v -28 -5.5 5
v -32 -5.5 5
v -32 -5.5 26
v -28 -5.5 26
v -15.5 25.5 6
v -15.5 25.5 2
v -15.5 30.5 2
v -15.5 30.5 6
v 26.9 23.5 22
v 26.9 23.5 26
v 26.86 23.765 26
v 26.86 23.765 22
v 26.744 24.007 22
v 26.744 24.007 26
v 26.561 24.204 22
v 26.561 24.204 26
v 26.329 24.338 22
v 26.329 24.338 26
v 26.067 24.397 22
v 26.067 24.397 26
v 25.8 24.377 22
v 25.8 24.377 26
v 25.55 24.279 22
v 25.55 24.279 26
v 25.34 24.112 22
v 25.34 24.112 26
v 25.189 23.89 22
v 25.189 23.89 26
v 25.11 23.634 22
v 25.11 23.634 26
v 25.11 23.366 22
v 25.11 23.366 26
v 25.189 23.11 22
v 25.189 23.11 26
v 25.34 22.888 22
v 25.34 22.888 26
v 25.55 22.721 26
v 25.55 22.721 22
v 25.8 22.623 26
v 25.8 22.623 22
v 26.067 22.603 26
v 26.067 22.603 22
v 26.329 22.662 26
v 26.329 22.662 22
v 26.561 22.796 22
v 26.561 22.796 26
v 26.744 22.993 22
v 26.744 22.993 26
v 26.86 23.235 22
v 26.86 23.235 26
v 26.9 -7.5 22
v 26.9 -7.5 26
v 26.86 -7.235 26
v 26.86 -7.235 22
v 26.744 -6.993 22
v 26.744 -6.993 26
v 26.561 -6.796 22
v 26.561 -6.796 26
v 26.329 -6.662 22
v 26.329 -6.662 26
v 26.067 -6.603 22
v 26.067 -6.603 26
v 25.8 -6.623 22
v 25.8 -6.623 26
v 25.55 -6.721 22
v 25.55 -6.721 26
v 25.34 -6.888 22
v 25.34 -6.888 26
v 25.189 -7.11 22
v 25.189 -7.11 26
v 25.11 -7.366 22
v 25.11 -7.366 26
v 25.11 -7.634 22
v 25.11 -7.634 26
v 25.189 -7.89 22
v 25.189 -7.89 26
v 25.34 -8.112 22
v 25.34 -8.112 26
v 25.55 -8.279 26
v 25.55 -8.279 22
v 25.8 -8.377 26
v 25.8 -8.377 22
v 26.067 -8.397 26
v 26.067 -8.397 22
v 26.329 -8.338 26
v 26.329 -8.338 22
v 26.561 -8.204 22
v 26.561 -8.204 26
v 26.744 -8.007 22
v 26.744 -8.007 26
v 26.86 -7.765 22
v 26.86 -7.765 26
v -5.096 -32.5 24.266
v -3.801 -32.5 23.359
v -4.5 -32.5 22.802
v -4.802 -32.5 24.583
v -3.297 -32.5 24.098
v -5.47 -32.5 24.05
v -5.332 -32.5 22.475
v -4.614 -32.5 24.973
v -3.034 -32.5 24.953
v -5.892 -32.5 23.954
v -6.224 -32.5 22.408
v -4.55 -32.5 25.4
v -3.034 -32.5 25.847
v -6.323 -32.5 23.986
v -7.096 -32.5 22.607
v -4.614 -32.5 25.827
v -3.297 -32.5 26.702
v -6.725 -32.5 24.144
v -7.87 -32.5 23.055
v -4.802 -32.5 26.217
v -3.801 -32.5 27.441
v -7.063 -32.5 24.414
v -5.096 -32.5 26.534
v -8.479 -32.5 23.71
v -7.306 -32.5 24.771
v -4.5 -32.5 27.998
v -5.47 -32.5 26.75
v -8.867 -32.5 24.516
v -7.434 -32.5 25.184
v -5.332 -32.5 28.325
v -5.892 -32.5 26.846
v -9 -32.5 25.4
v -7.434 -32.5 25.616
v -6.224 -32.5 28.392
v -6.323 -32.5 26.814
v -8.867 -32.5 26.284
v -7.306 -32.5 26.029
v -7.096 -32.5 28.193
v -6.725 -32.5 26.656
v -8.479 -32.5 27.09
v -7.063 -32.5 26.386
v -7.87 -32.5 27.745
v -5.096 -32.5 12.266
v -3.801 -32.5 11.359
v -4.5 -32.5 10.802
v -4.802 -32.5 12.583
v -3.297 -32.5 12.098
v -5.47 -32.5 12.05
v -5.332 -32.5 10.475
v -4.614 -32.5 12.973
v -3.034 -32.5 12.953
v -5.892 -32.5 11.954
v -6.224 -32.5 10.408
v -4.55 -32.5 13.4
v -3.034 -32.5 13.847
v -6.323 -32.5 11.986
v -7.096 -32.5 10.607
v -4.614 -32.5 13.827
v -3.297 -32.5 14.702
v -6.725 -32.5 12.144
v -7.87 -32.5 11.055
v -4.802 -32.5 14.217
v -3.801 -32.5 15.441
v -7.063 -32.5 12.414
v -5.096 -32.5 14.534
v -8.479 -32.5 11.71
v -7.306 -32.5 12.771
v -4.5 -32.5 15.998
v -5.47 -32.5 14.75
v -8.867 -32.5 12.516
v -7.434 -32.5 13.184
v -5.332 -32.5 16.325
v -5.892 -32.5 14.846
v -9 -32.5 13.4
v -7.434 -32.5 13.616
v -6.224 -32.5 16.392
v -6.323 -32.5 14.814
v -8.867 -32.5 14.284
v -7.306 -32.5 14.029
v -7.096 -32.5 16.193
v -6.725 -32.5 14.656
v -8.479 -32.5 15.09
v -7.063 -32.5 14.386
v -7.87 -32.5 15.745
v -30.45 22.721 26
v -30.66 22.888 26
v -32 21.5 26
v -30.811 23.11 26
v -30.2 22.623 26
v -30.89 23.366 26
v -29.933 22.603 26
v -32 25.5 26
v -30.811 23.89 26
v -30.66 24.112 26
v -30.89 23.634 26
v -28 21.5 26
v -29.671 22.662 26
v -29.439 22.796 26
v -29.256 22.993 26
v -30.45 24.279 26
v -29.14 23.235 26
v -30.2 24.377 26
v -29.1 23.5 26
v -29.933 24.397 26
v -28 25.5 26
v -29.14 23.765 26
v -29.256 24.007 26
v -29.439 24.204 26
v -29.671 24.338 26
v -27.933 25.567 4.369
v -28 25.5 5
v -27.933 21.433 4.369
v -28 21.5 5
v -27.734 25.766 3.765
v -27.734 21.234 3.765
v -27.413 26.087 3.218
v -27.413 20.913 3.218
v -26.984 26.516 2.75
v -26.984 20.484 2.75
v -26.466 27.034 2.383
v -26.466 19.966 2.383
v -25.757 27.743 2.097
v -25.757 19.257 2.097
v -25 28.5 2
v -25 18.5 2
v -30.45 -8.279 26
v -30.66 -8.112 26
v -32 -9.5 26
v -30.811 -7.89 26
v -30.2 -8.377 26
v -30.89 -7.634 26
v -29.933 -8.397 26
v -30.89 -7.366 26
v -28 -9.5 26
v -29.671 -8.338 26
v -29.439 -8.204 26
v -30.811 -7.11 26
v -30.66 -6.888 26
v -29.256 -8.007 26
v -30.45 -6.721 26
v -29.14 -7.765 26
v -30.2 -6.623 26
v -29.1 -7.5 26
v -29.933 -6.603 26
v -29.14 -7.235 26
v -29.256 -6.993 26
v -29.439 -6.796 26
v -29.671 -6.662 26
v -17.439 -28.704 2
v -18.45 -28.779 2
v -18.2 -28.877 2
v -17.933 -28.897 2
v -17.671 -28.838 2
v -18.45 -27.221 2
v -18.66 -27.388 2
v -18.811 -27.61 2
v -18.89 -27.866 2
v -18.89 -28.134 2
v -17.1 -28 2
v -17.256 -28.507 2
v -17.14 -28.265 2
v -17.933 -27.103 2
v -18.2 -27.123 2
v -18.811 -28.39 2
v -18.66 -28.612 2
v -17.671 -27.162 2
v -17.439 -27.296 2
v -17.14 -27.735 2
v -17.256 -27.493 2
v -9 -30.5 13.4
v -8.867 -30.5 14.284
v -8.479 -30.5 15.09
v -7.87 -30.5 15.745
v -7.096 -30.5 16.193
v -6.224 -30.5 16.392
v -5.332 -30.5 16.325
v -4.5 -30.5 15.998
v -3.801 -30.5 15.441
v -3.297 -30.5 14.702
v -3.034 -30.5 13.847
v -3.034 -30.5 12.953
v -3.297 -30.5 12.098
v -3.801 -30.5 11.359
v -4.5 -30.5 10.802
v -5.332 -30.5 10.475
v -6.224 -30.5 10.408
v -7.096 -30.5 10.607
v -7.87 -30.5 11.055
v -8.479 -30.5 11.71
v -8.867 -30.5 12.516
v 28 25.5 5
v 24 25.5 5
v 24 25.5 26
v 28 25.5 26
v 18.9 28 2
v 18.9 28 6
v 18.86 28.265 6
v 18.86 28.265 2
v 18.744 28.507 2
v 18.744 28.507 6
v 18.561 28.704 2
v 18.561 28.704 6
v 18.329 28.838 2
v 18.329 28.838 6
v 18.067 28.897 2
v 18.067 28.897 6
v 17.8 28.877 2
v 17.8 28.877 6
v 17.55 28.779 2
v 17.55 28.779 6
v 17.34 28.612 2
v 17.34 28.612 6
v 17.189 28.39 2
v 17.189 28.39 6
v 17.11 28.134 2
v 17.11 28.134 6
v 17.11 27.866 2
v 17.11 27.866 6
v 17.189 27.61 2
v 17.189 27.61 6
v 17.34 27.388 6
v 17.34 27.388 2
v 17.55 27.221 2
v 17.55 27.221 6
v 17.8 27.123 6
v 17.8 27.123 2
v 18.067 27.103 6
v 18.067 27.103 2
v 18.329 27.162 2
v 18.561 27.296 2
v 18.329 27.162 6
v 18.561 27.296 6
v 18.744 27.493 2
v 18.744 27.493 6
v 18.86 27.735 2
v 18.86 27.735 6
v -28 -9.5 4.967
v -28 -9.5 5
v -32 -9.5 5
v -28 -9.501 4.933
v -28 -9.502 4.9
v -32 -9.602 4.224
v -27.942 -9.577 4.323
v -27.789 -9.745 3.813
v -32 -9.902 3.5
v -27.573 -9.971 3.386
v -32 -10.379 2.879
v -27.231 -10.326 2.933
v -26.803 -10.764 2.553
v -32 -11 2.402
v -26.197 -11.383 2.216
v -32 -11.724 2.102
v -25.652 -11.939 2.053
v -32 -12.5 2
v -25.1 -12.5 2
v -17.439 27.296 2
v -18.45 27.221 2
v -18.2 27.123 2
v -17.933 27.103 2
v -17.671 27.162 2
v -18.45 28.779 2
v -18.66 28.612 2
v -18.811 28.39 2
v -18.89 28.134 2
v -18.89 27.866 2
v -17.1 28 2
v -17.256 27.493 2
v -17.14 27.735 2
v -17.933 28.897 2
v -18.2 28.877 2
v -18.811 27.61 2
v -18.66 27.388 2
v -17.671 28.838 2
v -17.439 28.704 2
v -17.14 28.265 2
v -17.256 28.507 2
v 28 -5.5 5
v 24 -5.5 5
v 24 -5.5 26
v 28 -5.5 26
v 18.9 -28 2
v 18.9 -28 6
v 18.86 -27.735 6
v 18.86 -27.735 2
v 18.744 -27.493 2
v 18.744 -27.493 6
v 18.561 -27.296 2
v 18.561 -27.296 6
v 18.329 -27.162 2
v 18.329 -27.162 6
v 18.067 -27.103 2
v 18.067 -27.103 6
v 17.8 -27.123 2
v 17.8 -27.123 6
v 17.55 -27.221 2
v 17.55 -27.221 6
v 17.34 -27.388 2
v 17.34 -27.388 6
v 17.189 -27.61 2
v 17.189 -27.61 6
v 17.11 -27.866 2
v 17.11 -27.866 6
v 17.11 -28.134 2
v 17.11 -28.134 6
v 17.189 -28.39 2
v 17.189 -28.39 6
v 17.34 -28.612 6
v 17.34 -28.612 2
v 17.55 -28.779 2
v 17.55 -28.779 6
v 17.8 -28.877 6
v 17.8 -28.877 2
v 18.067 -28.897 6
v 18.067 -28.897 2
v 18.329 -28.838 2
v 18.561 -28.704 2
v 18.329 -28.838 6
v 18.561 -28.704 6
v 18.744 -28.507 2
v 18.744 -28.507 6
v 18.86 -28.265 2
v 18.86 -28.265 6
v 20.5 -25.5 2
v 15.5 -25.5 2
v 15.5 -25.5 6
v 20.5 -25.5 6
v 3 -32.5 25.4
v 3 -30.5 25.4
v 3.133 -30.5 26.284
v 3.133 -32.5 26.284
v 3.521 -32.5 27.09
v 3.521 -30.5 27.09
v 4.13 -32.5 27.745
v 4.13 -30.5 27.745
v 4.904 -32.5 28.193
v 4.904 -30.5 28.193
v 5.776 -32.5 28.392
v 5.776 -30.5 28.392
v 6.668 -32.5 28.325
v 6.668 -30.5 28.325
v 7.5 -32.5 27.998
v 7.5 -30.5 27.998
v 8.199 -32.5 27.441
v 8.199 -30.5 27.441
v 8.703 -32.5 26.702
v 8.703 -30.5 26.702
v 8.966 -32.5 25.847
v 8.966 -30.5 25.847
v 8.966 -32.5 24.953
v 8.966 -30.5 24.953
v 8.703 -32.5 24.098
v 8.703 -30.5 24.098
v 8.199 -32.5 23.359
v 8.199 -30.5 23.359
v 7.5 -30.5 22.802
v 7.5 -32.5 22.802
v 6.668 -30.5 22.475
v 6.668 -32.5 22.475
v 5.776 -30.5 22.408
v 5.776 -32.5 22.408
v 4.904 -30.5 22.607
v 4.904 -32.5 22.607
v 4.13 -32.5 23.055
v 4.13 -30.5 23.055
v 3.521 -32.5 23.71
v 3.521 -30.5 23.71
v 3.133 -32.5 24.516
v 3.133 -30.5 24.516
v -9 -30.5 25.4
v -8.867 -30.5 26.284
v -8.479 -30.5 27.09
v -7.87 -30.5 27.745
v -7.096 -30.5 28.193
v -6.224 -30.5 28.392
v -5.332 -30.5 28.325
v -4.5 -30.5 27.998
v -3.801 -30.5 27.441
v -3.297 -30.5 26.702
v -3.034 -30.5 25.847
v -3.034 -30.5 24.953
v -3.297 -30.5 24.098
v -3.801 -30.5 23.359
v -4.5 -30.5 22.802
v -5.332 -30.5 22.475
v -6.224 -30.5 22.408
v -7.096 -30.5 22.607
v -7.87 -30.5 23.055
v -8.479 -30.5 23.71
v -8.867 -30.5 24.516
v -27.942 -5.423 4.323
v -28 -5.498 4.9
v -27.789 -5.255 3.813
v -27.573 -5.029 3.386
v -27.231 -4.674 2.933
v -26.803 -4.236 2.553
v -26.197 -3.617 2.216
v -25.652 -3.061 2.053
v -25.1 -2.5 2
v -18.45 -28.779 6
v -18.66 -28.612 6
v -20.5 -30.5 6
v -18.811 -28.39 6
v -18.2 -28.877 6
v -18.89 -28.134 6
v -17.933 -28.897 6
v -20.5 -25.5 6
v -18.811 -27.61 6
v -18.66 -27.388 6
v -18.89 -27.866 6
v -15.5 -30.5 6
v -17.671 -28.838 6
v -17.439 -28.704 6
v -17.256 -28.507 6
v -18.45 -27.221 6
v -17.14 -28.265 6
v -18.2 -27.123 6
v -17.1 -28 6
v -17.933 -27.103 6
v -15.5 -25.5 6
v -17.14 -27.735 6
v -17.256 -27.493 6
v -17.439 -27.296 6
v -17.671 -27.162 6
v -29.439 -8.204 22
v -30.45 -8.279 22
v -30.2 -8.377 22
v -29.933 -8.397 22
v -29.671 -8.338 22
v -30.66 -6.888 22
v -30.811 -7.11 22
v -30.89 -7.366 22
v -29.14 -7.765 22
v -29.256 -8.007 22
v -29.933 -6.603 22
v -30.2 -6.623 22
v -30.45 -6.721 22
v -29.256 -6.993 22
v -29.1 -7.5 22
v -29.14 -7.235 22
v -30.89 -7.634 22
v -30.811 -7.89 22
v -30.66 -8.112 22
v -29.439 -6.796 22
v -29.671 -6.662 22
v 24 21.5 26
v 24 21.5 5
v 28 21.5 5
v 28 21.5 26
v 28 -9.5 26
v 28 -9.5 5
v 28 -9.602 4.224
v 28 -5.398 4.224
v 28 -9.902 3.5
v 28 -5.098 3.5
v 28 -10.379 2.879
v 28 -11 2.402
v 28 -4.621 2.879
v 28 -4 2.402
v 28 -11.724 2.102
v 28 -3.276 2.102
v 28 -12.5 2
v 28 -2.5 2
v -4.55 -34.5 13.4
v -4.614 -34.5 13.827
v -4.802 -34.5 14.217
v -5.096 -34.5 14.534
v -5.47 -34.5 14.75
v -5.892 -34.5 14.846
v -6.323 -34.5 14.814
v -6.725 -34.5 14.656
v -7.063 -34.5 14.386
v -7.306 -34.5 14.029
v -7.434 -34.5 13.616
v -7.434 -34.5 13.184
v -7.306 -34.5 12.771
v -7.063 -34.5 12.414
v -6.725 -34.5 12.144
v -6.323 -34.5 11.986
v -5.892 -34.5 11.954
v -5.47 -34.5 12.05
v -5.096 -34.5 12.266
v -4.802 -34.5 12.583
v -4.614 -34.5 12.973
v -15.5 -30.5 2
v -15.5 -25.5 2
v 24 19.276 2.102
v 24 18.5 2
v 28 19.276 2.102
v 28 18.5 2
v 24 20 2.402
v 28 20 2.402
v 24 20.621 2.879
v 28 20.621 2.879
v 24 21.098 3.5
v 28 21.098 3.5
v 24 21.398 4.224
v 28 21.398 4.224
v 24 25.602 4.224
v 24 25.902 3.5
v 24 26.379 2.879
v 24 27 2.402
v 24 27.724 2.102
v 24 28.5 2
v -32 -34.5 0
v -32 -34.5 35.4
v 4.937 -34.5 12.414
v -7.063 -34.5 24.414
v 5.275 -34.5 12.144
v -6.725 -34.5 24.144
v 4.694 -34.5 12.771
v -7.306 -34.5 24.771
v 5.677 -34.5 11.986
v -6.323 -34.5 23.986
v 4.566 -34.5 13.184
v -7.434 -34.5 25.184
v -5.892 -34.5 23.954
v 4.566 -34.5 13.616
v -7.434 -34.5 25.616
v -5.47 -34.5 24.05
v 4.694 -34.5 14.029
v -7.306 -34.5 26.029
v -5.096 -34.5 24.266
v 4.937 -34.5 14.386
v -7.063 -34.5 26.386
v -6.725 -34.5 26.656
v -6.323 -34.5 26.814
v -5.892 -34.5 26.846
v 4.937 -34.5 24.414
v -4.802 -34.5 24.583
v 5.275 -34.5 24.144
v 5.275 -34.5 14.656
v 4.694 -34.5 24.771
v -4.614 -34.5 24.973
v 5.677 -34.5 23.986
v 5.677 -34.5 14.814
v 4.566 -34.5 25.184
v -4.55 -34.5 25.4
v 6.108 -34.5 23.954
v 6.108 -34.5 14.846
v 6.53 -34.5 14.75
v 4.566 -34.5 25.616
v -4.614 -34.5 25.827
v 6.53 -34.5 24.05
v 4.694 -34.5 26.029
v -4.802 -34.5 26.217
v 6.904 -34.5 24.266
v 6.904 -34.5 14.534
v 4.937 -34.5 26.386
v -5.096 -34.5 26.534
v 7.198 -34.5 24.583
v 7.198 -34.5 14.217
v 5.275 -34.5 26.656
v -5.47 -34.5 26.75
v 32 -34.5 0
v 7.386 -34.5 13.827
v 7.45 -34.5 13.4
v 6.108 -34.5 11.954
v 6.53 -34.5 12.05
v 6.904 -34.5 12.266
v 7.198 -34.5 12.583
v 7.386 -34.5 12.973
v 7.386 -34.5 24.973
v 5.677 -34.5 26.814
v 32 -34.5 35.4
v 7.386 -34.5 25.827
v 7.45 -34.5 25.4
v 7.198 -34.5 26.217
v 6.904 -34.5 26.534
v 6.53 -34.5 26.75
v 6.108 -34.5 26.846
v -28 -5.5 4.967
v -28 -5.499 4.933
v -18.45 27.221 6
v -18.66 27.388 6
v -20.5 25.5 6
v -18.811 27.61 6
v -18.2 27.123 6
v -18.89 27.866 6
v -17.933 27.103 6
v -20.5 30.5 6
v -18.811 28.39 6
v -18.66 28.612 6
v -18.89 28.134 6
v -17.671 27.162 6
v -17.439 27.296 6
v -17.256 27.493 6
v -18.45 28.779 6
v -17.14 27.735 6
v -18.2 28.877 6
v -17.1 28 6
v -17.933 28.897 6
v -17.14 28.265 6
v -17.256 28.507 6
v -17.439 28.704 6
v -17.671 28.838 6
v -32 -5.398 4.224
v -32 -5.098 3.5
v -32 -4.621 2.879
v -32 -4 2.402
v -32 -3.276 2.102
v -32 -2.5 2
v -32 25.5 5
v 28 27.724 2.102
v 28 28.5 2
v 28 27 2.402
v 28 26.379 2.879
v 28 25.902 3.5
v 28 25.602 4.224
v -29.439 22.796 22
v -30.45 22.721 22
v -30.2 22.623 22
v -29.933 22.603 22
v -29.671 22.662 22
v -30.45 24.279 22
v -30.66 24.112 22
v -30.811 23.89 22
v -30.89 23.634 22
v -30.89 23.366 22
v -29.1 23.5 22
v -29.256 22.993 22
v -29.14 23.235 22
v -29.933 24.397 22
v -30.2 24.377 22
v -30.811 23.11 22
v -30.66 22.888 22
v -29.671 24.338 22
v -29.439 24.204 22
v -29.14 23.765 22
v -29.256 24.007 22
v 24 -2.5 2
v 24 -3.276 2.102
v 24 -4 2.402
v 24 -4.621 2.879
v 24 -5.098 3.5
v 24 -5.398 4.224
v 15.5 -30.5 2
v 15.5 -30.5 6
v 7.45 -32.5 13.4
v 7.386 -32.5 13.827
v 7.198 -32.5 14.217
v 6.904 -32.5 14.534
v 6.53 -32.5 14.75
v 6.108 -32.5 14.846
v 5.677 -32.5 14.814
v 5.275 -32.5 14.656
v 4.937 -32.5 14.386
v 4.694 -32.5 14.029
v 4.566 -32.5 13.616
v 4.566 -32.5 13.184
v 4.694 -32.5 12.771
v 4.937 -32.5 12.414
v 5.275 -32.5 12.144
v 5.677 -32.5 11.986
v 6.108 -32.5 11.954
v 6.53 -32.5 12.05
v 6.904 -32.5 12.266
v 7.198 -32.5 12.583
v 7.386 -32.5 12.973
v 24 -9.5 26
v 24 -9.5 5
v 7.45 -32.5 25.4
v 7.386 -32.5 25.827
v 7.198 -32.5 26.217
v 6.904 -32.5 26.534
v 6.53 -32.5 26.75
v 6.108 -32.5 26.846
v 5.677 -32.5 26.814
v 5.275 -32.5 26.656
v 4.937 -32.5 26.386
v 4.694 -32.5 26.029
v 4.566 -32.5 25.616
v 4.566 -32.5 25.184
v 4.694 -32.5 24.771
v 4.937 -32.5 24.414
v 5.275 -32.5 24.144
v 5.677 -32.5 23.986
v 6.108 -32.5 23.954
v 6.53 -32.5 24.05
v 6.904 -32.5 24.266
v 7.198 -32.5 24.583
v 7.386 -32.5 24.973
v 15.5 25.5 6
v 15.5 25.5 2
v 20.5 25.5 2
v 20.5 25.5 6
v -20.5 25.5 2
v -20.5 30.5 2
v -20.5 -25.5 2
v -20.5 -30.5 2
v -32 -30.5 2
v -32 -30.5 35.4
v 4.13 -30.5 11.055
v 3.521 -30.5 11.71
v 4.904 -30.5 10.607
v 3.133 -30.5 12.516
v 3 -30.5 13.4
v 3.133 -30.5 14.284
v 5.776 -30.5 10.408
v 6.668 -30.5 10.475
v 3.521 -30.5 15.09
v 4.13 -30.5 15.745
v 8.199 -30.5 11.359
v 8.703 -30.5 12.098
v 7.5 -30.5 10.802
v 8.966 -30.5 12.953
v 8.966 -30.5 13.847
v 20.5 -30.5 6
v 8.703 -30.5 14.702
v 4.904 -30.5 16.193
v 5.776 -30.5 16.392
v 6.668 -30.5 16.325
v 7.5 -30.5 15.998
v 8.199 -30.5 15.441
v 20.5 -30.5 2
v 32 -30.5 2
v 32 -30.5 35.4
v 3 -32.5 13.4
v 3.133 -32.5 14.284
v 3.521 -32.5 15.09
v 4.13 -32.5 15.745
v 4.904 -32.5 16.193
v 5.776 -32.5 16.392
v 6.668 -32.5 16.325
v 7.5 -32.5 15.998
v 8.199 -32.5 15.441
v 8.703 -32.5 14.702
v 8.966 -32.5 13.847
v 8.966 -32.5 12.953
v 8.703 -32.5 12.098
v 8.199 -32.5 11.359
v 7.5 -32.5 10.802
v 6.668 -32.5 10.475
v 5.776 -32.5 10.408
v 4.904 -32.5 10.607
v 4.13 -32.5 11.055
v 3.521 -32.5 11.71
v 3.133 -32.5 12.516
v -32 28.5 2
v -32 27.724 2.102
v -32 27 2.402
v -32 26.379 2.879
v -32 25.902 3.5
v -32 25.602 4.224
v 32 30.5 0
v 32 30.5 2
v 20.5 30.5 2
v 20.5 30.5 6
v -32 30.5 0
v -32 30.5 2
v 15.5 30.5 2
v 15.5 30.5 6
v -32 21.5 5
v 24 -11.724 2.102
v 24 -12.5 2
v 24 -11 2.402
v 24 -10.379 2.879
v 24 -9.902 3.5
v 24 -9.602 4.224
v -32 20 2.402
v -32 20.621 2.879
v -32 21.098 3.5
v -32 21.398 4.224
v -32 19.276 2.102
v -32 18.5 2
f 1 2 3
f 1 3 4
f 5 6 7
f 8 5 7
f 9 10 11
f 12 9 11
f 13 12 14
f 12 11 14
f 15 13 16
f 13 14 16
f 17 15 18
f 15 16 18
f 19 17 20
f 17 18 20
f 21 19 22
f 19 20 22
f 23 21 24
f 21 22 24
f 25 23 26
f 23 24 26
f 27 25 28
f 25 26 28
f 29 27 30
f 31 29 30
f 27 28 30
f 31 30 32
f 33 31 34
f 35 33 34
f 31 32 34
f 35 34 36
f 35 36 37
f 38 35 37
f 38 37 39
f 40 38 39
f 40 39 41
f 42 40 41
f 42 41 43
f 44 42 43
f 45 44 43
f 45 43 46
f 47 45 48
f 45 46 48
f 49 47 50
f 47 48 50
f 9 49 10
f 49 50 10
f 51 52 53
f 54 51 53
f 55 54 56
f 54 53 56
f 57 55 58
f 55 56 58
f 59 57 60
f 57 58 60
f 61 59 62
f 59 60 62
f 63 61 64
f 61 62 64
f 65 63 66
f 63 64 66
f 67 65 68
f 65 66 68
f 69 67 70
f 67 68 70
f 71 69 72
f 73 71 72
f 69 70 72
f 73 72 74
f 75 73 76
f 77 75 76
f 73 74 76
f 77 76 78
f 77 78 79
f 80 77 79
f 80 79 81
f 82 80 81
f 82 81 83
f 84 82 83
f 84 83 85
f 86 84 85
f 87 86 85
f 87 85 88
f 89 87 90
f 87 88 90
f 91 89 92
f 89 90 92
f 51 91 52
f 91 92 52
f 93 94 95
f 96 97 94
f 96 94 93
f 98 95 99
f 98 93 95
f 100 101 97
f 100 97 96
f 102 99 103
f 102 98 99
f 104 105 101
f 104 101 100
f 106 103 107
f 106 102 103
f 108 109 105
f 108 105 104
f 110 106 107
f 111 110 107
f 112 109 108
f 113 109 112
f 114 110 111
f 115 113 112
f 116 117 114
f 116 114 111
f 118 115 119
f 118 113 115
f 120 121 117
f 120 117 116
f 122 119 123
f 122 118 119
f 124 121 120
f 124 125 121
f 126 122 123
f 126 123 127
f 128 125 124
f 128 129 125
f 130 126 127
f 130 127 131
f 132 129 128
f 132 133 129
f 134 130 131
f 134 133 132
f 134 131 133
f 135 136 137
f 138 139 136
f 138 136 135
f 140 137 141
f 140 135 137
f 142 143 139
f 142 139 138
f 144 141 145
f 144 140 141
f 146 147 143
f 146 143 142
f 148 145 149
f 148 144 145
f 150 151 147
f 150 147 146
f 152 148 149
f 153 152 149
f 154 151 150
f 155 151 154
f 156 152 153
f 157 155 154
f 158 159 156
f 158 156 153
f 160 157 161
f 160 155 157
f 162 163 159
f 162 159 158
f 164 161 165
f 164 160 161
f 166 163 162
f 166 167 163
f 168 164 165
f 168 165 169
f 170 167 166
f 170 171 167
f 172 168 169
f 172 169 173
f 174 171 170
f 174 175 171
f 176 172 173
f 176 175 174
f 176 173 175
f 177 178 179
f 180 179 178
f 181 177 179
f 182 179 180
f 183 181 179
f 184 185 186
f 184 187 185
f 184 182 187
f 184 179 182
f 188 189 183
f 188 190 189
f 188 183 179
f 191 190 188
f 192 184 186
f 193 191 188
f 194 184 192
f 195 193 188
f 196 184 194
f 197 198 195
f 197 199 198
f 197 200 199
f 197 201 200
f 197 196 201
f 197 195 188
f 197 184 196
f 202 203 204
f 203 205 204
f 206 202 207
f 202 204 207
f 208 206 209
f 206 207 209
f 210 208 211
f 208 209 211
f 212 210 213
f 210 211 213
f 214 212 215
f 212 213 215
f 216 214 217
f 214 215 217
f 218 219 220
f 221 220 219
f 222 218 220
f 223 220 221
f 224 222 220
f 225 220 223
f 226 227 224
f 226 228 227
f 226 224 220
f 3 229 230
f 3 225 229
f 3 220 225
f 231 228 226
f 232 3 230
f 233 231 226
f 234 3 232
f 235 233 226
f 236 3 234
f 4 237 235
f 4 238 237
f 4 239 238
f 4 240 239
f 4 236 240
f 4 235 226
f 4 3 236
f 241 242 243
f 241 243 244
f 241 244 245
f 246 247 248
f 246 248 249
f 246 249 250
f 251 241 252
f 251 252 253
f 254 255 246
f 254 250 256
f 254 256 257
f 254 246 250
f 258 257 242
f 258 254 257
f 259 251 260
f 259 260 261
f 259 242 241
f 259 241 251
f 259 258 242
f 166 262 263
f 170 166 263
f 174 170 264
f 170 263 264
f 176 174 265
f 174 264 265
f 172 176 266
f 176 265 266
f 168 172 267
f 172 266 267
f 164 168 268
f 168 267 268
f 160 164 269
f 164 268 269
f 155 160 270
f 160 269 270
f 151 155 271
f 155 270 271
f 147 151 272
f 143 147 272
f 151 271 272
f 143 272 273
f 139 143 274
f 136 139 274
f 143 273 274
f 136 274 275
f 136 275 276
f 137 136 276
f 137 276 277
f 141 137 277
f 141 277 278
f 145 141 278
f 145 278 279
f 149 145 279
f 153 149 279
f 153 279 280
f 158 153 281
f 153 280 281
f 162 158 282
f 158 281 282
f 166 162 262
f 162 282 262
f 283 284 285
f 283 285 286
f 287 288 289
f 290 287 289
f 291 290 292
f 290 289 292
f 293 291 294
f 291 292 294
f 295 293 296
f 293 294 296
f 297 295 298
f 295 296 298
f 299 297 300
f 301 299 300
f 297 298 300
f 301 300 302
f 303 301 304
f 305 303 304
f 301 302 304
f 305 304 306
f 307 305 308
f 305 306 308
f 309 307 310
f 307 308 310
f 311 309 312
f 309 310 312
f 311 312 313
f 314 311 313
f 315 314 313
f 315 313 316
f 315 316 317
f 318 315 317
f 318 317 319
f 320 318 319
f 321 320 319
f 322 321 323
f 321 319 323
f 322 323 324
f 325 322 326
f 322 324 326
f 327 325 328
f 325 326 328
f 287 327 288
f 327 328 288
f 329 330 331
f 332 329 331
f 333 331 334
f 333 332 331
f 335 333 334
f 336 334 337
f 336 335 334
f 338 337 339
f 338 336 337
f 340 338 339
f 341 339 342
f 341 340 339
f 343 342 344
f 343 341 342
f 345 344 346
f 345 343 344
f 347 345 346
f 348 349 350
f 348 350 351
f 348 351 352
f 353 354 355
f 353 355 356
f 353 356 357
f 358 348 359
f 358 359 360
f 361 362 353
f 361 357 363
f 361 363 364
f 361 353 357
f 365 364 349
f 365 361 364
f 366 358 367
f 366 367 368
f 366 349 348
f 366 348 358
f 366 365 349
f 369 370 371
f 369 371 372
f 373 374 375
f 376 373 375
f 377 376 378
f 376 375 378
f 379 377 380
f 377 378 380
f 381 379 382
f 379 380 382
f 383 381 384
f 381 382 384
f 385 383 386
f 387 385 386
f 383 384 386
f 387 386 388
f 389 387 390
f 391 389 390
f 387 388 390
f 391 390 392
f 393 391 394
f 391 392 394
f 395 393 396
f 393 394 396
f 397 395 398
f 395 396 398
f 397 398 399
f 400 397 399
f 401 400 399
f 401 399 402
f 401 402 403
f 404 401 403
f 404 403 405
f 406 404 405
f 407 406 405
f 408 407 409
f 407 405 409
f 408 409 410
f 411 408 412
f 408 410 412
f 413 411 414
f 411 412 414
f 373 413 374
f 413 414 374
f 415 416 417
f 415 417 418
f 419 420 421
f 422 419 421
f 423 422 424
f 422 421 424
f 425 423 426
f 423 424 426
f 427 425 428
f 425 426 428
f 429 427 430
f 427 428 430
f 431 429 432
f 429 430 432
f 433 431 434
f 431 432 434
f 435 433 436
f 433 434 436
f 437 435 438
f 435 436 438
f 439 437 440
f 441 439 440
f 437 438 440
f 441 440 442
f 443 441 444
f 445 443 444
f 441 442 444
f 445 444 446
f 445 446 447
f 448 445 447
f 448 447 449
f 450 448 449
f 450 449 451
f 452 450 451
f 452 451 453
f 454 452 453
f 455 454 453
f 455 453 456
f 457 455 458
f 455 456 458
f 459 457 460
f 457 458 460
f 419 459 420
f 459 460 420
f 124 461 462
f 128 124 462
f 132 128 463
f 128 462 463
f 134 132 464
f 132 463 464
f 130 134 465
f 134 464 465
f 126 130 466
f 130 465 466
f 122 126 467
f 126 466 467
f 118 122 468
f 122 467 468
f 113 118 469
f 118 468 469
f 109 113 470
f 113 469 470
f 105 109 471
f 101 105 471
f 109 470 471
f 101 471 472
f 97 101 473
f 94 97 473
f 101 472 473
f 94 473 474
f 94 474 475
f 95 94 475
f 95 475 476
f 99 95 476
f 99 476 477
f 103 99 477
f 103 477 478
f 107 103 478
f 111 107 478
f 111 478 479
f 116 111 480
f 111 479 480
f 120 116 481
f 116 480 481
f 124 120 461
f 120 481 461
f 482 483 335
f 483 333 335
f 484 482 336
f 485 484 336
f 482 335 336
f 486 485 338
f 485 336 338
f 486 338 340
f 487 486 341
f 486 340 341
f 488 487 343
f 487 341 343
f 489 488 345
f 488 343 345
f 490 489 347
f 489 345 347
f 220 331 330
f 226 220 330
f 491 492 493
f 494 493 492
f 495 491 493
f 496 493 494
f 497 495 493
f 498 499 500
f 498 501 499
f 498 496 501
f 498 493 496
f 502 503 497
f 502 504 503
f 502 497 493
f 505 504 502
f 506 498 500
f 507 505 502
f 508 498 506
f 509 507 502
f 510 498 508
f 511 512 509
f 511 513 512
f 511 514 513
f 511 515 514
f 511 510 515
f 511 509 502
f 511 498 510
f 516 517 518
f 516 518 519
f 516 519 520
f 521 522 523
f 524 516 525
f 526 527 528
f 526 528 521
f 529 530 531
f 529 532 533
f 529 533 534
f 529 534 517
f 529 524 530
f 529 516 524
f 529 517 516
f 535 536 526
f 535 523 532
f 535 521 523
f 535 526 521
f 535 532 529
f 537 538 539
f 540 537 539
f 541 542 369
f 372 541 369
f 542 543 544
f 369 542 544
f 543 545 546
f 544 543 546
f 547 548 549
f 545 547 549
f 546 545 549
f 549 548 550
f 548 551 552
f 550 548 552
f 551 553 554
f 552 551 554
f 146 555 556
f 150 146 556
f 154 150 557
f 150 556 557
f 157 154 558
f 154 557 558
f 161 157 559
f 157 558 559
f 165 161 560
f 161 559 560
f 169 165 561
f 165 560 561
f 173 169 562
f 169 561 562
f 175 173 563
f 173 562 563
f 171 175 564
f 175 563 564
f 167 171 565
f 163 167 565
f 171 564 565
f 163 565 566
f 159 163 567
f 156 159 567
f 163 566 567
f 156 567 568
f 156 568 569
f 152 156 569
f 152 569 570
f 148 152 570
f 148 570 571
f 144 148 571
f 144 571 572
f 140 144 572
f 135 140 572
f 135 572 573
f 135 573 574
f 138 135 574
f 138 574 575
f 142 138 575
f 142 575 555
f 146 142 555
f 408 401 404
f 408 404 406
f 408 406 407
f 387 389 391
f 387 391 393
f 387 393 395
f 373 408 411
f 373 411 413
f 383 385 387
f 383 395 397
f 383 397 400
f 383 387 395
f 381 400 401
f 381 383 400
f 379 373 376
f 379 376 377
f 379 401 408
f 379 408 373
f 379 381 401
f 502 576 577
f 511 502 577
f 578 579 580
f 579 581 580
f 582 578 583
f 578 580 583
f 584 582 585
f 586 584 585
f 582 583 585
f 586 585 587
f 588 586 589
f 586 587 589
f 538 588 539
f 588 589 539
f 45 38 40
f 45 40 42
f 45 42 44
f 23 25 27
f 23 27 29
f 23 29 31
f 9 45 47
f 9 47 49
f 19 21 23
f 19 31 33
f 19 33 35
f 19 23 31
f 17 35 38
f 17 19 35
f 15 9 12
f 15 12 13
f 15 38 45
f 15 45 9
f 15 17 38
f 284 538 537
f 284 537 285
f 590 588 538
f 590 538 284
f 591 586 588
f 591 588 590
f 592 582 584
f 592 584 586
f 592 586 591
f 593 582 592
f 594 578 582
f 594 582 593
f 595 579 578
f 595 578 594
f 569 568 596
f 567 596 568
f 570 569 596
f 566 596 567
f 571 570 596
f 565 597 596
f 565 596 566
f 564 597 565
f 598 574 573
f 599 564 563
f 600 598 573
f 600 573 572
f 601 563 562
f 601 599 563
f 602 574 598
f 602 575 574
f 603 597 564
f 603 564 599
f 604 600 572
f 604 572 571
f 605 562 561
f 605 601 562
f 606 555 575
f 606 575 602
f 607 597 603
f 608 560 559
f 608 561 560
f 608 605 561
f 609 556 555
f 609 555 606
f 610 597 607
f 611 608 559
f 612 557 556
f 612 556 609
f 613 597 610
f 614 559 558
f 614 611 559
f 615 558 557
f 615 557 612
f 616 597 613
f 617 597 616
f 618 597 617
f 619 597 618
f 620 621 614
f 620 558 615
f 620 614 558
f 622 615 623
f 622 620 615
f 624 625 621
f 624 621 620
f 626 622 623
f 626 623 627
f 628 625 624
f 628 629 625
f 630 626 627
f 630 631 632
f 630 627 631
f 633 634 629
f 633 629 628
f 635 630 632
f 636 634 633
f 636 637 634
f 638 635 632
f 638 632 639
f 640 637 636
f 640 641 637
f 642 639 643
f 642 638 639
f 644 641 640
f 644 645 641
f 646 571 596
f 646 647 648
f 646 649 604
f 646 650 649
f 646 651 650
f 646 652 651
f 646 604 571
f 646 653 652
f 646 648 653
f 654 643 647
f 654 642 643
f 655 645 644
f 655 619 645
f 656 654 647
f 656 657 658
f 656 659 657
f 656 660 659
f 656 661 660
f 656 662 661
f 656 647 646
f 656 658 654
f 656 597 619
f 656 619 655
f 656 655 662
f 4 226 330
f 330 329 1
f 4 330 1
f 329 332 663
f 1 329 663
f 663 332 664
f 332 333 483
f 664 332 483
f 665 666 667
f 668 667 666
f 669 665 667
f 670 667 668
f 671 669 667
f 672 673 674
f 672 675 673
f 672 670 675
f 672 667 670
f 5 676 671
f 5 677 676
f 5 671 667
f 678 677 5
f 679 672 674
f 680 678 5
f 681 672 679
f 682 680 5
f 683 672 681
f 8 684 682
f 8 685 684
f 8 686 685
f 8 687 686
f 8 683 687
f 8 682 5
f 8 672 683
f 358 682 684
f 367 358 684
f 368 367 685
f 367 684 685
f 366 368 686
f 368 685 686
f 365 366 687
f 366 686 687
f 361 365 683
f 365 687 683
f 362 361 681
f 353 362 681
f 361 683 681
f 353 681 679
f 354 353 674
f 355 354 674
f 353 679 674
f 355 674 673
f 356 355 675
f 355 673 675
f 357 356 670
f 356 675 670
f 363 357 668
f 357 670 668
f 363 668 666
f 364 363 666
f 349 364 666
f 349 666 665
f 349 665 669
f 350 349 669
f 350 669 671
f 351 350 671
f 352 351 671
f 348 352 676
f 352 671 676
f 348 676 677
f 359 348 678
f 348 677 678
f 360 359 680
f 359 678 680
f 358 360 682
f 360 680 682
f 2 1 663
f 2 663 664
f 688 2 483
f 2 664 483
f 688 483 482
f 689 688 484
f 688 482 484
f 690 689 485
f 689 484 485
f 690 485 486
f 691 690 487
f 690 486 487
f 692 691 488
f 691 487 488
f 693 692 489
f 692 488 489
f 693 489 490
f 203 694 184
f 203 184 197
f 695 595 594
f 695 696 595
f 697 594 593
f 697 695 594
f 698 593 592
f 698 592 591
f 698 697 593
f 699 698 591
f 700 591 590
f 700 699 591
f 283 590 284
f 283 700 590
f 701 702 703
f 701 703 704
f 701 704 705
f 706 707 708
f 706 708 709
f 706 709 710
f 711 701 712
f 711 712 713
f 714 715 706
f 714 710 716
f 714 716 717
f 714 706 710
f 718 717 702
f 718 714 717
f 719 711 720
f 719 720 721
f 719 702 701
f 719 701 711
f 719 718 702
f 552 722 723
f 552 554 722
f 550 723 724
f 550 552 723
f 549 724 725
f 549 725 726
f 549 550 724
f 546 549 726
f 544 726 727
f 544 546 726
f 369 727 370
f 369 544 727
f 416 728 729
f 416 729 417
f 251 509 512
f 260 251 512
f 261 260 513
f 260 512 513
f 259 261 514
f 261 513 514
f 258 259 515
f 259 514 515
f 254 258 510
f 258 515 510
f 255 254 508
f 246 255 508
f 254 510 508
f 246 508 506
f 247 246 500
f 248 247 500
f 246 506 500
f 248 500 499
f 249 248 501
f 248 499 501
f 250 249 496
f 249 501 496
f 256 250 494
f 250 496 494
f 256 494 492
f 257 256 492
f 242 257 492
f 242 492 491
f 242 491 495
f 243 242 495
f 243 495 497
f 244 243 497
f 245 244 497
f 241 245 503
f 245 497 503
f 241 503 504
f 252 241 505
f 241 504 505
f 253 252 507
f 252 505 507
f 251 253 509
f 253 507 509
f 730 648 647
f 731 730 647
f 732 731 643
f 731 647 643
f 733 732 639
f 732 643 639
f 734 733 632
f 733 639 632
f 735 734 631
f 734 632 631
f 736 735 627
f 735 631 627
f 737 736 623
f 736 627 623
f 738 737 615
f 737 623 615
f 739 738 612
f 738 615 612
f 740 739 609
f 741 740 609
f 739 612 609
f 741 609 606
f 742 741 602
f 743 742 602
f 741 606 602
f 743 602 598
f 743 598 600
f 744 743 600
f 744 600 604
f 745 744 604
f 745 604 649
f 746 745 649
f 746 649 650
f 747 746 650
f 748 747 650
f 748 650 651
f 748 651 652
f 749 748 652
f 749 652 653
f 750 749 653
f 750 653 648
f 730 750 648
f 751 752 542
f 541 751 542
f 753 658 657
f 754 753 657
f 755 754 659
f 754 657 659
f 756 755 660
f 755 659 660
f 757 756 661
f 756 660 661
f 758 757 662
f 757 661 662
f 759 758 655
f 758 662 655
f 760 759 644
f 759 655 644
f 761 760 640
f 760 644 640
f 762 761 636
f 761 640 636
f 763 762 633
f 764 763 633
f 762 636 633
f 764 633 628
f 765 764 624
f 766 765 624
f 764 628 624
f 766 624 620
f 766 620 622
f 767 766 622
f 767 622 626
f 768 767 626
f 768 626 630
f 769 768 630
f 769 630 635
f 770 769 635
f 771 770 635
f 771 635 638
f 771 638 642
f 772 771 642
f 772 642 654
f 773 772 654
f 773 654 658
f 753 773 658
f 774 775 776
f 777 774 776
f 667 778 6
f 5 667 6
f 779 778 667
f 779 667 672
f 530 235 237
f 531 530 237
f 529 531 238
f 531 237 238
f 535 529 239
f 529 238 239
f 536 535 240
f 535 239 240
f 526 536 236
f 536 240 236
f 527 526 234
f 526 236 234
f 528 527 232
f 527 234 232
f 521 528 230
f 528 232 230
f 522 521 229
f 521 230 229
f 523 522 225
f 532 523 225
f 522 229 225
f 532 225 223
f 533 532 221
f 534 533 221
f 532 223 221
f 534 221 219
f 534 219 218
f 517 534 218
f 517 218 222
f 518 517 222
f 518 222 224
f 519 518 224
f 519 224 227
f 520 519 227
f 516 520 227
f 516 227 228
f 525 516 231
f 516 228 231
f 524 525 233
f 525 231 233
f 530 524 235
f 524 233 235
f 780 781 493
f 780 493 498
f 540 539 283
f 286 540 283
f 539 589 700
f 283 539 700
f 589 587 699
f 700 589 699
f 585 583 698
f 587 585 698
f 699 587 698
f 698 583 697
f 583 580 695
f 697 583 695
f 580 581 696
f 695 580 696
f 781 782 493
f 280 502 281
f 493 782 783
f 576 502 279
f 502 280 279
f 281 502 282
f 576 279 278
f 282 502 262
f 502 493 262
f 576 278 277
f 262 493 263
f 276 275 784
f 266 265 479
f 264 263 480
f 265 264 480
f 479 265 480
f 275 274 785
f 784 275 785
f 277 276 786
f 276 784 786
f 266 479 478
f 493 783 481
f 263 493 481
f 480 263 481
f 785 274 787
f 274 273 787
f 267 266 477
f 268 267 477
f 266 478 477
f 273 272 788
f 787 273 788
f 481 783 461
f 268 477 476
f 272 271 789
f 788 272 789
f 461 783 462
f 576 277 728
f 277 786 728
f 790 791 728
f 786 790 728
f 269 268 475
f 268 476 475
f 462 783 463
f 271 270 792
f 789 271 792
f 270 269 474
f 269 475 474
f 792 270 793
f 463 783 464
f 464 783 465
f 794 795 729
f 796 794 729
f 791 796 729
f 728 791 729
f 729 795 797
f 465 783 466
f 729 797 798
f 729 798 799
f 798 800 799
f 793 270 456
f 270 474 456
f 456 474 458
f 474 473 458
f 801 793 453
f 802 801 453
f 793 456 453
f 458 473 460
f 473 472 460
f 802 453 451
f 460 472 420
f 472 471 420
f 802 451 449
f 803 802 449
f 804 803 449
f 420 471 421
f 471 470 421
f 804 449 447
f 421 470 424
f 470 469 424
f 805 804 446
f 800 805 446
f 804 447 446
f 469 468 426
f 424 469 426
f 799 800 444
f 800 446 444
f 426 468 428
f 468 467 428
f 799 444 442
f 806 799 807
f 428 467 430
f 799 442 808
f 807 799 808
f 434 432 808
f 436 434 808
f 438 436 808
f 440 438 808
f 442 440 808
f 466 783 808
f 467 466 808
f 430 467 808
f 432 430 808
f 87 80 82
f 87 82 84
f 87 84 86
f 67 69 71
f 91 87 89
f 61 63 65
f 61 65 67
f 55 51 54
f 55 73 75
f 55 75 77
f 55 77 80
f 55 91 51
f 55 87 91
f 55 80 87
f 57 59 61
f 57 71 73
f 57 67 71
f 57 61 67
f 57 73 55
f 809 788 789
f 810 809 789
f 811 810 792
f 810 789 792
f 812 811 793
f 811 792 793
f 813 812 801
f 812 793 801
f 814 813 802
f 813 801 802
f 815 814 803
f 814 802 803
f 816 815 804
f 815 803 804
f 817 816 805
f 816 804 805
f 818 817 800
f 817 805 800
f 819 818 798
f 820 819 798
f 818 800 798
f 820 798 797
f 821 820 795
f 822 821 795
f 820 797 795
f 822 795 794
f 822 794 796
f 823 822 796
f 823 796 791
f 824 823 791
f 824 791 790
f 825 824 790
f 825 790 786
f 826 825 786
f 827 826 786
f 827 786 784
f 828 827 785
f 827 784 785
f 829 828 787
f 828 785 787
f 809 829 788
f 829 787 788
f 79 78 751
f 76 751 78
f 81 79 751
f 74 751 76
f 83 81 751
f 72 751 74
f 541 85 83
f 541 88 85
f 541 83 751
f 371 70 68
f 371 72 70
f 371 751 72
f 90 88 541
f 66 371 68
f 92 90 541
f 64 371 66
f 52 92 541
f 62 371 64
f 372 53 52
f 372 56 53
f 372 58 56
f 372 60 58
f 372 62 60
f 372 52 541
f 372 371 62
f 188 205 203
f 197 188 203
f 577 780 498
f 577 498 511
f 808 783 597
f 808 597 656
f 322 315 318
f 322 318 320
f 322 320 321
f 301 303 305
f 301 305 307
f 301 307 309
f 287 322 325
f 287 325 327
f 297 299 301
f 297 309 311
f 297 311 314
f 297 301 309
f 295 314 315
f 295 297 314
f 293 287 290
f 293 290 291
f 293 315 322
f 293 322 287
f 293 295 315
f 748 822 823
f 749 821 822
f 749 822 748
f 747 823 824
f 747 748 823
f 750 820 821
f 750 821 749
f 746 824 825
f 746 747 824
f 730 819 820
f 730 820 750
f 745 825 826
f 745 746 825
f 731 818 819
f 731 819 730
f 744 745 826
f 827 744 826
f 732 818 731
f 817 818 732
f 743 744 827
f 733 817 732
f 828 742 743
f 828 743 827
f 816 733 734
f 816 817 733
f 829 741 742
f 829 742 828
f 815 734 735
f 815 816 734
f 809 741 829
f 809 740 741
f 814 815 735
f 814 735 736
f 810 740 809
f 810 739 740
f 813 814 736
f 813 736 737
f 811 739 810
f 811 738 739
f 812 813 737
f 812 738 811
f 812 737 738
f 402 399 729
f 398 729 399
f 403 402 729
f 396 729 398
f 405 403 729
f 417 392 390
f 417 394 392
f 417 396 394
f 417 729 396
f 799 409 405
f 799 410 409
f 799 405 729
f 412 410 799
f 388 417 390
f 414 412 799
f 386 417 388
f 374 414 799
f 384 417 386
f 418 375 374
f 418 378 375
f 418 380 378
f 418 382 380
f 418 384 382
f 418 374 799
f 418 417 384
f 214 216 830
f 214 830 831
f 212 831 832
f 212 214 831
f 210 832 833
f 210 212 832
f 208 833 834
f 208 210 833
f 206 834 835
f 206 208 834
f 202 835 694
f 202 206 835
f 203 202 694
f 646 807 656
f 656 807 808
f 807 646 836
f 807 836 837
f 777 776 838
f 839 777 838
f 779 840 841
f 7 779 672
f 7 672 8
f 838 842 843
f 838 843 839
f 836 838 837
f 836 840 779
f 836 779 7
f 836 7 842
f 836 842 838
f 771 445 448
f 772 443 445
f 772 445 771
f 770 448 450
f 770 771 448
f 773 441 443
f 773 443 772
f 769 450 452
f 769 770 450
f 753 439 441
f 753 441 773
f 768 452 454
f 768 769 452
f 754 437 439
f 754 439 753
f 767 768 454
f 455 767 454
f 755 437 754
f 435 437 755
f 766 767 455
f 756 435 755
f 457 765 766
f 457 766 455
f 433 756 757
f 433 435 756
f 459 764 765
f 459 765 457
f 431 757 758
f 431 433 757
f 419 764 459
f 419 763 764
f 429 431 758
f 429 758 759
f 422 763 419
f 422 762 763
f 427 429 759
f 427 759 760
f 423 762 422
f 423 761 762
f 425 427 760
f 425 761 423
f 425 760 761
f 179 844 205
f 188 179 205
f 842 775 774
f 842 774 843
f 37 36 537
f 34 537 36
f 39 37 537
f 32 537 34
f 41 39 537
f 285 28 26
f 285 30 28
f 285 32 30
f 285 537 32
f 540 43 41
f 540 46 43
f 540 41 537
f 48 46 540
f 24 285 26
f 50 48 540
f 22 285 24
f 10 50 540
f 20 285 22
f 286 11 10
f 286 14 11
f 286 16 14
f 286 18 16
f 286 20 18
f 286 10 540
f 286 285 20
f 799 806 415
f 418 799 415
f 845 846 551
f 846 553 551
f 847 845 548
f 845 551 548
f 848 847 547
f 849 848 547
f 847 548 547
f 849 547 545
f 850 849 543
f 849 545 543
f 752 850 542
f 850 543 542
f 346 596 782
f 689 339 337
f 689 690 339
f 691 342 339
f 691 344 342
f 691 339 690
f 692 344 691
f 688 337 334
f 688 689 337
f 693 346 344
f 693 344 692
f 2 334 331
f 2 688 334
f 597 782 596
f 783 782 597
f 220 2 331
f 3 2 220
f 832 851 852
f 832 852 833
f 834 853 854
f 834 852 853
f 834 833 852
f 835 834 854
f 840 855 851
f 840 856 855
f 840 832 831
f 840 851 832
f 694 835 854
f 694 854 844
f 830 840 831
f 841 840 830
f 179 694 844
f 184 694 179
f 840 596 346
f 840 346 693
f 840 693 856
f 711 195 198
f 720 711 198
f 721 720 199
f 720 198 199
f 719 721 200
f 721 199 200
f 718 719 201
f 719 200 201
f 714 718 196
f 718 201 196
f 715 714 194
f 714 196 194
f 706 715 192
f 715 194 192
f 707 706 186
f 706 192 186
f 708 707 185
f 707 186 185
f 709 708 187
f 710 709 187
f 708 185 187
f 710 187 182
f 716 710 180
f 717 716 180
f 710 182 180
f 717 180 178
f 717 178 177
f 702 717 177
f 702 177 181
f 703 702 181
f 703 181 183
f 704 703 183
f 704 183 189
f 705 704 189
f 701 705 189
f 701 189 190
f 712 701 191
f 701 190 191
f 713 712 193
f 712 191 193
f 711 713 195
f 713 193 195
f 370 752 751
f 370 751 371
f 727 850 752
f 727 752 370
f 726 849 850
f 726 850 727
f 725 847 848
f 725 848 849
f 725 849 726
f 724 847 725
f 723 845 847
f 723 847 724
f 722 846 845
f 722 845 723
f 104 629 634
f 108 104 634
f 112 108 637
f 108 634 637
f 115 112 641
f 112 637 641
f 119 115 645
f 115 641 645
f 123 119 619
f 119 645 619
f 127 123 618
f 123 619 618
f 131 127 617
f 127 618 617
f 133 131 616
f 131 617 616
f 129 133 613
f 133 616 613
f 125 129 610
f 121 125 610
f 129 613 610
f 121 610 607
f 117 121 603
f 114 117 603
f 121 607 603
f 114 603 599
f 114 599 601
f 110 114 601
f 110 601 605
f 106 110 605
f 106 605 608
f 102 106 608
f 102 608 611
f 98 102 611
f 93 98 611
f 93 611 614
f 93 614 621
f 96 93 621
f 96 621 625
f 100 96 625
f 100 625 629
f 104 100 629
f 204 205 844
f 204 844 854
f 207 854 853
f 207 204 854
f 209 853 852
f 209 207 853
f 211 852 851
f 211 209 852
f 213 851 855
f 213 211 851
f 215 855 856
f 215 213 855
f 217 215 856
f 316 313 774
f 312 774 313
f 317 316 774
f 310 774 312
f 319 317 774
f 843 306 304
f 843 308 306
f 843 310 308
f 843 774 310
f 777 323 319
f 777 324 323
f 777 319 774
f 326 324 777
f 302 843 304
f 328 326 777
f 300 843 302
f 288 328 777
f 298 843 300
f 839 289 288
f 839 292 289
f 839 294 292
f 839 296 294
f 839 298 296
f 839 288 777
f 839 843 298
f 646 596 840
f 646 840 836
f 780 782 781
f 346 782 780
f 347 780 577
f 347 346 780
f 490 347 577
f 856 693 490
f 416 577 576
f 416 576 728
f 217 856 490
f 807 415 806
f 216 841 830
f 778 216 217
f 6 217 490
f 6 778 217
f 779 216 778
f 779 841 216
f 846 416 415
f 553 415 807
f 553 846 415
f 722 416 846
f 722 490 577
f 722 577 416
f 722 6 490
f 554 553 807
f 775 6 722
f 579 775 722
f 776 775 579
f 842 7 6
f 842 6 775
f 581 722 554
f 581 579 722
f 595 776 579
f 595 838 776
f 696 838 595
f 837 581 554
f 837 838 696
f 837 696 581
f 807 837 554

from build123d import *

# Parameters (mm, degrees)
SKETCH_W        = 64
SKETCH_H        = 61
PAD_DEPTH       = 2
SKETCH001_W     = 5
SKETCH001_H     = 5
PAD001_DEPTH    = 4
SKETCH002_R     = 0.9
POCKET_DEPTH    = 4
SKETCH003_W     = 4
SKETCH003_H     = 4
PAD002_DEPTH    = 24
SKETCH004_R     = 0.9
POCKET001_DEPTH = 4
FILLET_R        = 3
FILLET001_R     = 3
FILLET002_R     = 3
FILLET003_R     = 3
FILLET004_R     = 3
FILLET005_R     = 2.9
FILLET006_R     = 3
FILLET007_R     = 3
FILLET008_R     = 3
FILLET009_R     = 3
SKETCH005_W     = 64
SKETCH005_H     = 35.4
PAD003_DEPTH    = 4
SKETCH006_R     = 3
POCKET002_DEPTH = 2
SKETCH007_R     = 1.45
POCKET003_DEPTH = 5


with BuildPart() as part:
    # Sketch → Pad (new body)
    with BuildSketch(Plane.XY):
        Rectangle(SKETCH_W, SKETCH_H)
    extrude(amount=PAD_DEPTH)

    # Sketch001 (on Face6 of Pad) → Pad001 (join)
    with BuildSketch(Plane.XY.offset(2)):
        with Locations((-18, 28)):
            Rectangle(SKETCH001_W, SKETCH001_H)
        with Locations((18, 28)):
            Rectangle(SKETCH001_W, SKETCH001_H)
        with Locations((-18, -28)):
            Rectangle(SKETCH001_W, SKETCH001_H)
        with Locations((18, -28)):
            Rectangle(SKETCH001_W, SKETCH001_H)
    extrude(amount=PAD001_DEPTH)

    # Sketch002 (on Face26 of Pad001) → Pocket (cut)
    with BuildSketch(Plane.XY.offset(6)):
        with Locations((-18, -28)):
            Circle(SKETCH002_R)
        with Locations((18, -28)):
            Circle(SKETCH002_R)
        with Locations((18, 28)):
            Circle(SKETCH002_R)
        with Locations((-18, 28)):
            Circle(SKETCH002_R)
    extrude(amount=-POCKET_DEPTH, mode=Mode.SUBTRACT)

    # Sketch003 (on Face5 of Pocket) → Pad002 (join)
    with BuildSketch(Plane.XY.offset(2)):
        with Locations((-30, 23.5)):
            Rectangle(SKETCH003_W, SKETCH003_H)
        with Locations((-30, -7.5)):
            Rectangle(SKETCH003_W, SKETCH003_H)
        with Locations((26, 23.5)):
            Rectangle(SKETCH003_W, SKETCH003_H)
        with Locations((26, -7.5)):
            Rectangle(SKETCH003_W, SKETCH003_H)
    extrude(amount=PAD002_DEPTH)

    # Sketch004 (on Face42 of Pad002) → Pocket001 (cut)
    with BuildSketch(Plane.XY.offset(26)):
        with Locations((-30, 23.5)):
            Circle(SKETCH004_R)
        with Locations((26, 23.5)):
            Circle(SKETCH004_R)
        with Locations((26, -7.5)):
            Circle(SKETCH004_R)
        with Locations((-30, -7.5)):
            Circle(SKETCH004_R)
    extrude(amount=-POCKET001_DEPTH, mode=Mode.SUBTRACT)

    # Fillet
    fillet_edges = [part.edges().sort_by_distance(p)[0] for p in [
        (-30, 25.5, 2),
    ]]
    fillet(fillet_edges, radius=FILLET_R)

    # Fillet001
    fillet001_edges = [part.edges().sort_by_distance(p)[0] for p in [
        (-30, 21.5, 2),
    ]]
    fillet(fillet001_edges, radius=FILLET001_R)

    # Fillet002
    fillet002_edges = [part.edges().sort_by_distance(p)[0] for p in [
        (-28, 23.5, 2),
    ]]
    fillet(fillet002_edges, radius=FILLET002_R)

    # Fillet003
    fillet003_edges = [part.edges().sort_by_distance(p)[0] for p in [
        (-30, -9.5, 2),
    ]]
    fillet(fillet003_edges, radius=FILLET003_R)

    # Fillet004
    fillet004_edges = [part.edges().sort_by_distance(p)[0] for p in [
        (-30, -5.5, 2),
    ]]
    fillet(fillet004_edges, radius=FILLET004_R)

    # Fillet005
    fillet005_edges = [part.edges().sort_by_distance(p)[0] for p in [
        (-28, -7.5, 2),
    ]]
    fillet(fillet005_edges, radius=FILLET005_R)

    # Fillet006
    fillet006_edges = [part.edges().sort_by_distance(p)[0] for p in [
        (26, 25.5, 2),
    ]]
    fillet(fillet006_edges, radius=FILLET006_R)

    # Fillet007
    fillet007_edges = [part.edges().sort_by_distance(p)[0] for p in [
        (26, 21.5, 2),
    ]]
    fillet(fillet007_edges, radius=FILLET007_R)

    # Fillet008
    fillet008_edges = [part.edges().sort_by_distance(p)[0] for p in [
        (26, -9.5, 2),
    ]]
    fillet(fillet008_edges, radius=FILLET008_R)

    # Fillet009
    fillet009_edges = [part.edges().sort_by_distance(p)[0] for p in [
        (26, -5.5, 2),
    ]]
    fillet(fillet009_edges, radius=FILLET009_R)

    # Sketch005 (on Face20 of Fillet009) → Pad003 (join)
    with BuildSketch(Plane.XZ.offset(30.5)):
        with Locations((0, 17.7)):
            Rectangle(SKETCH005_W, SKETCH005_H)
    extrude(amount=PAD003_DEPTH)

    # Sketch006 (on Face20 of Pad003) → Pocket002 (cut)
    with BuildSketch(Plane(origin=(0, -30.5, 0), x_dir=(-1, 0, 0), z_dir=(0, 1, 0))):
        with Locations((6, 13.4)):
            Circle(SKETCH006_R)
        with Locations((-6, 13.4)):
            Circle(SKETCH006_R)
        with Locations((6, 25.4)):
            Circle(SKETCH006_R)
        with Locations((-6, 25.4)):
            Circle(SKETCH006_R)
    extrude(amount=-POCKET002_DEPTH, mode=Mode.SUBTRACT)

    # Sketch007 (on Face69 of Pocket002) → Pocket003 (cut)
    with BuildSketch(Plane.XZ.offset(34.5)):
        with Locations((-6, 25.4)):
            Circle(SKETCH007_R)
        with Locations((6, 25.4)):
            Circle(SKETCH007_R)
        with Locations((-6, 13.4)):
            Circle(SKETCH007_R)
        with Locations((6, 13.4)):
            Circle(SKETCH007_R)
    extrude(amount=-POCKET003_DEPTH, mode=Mode.SUBTRACT)


solid = part.part
